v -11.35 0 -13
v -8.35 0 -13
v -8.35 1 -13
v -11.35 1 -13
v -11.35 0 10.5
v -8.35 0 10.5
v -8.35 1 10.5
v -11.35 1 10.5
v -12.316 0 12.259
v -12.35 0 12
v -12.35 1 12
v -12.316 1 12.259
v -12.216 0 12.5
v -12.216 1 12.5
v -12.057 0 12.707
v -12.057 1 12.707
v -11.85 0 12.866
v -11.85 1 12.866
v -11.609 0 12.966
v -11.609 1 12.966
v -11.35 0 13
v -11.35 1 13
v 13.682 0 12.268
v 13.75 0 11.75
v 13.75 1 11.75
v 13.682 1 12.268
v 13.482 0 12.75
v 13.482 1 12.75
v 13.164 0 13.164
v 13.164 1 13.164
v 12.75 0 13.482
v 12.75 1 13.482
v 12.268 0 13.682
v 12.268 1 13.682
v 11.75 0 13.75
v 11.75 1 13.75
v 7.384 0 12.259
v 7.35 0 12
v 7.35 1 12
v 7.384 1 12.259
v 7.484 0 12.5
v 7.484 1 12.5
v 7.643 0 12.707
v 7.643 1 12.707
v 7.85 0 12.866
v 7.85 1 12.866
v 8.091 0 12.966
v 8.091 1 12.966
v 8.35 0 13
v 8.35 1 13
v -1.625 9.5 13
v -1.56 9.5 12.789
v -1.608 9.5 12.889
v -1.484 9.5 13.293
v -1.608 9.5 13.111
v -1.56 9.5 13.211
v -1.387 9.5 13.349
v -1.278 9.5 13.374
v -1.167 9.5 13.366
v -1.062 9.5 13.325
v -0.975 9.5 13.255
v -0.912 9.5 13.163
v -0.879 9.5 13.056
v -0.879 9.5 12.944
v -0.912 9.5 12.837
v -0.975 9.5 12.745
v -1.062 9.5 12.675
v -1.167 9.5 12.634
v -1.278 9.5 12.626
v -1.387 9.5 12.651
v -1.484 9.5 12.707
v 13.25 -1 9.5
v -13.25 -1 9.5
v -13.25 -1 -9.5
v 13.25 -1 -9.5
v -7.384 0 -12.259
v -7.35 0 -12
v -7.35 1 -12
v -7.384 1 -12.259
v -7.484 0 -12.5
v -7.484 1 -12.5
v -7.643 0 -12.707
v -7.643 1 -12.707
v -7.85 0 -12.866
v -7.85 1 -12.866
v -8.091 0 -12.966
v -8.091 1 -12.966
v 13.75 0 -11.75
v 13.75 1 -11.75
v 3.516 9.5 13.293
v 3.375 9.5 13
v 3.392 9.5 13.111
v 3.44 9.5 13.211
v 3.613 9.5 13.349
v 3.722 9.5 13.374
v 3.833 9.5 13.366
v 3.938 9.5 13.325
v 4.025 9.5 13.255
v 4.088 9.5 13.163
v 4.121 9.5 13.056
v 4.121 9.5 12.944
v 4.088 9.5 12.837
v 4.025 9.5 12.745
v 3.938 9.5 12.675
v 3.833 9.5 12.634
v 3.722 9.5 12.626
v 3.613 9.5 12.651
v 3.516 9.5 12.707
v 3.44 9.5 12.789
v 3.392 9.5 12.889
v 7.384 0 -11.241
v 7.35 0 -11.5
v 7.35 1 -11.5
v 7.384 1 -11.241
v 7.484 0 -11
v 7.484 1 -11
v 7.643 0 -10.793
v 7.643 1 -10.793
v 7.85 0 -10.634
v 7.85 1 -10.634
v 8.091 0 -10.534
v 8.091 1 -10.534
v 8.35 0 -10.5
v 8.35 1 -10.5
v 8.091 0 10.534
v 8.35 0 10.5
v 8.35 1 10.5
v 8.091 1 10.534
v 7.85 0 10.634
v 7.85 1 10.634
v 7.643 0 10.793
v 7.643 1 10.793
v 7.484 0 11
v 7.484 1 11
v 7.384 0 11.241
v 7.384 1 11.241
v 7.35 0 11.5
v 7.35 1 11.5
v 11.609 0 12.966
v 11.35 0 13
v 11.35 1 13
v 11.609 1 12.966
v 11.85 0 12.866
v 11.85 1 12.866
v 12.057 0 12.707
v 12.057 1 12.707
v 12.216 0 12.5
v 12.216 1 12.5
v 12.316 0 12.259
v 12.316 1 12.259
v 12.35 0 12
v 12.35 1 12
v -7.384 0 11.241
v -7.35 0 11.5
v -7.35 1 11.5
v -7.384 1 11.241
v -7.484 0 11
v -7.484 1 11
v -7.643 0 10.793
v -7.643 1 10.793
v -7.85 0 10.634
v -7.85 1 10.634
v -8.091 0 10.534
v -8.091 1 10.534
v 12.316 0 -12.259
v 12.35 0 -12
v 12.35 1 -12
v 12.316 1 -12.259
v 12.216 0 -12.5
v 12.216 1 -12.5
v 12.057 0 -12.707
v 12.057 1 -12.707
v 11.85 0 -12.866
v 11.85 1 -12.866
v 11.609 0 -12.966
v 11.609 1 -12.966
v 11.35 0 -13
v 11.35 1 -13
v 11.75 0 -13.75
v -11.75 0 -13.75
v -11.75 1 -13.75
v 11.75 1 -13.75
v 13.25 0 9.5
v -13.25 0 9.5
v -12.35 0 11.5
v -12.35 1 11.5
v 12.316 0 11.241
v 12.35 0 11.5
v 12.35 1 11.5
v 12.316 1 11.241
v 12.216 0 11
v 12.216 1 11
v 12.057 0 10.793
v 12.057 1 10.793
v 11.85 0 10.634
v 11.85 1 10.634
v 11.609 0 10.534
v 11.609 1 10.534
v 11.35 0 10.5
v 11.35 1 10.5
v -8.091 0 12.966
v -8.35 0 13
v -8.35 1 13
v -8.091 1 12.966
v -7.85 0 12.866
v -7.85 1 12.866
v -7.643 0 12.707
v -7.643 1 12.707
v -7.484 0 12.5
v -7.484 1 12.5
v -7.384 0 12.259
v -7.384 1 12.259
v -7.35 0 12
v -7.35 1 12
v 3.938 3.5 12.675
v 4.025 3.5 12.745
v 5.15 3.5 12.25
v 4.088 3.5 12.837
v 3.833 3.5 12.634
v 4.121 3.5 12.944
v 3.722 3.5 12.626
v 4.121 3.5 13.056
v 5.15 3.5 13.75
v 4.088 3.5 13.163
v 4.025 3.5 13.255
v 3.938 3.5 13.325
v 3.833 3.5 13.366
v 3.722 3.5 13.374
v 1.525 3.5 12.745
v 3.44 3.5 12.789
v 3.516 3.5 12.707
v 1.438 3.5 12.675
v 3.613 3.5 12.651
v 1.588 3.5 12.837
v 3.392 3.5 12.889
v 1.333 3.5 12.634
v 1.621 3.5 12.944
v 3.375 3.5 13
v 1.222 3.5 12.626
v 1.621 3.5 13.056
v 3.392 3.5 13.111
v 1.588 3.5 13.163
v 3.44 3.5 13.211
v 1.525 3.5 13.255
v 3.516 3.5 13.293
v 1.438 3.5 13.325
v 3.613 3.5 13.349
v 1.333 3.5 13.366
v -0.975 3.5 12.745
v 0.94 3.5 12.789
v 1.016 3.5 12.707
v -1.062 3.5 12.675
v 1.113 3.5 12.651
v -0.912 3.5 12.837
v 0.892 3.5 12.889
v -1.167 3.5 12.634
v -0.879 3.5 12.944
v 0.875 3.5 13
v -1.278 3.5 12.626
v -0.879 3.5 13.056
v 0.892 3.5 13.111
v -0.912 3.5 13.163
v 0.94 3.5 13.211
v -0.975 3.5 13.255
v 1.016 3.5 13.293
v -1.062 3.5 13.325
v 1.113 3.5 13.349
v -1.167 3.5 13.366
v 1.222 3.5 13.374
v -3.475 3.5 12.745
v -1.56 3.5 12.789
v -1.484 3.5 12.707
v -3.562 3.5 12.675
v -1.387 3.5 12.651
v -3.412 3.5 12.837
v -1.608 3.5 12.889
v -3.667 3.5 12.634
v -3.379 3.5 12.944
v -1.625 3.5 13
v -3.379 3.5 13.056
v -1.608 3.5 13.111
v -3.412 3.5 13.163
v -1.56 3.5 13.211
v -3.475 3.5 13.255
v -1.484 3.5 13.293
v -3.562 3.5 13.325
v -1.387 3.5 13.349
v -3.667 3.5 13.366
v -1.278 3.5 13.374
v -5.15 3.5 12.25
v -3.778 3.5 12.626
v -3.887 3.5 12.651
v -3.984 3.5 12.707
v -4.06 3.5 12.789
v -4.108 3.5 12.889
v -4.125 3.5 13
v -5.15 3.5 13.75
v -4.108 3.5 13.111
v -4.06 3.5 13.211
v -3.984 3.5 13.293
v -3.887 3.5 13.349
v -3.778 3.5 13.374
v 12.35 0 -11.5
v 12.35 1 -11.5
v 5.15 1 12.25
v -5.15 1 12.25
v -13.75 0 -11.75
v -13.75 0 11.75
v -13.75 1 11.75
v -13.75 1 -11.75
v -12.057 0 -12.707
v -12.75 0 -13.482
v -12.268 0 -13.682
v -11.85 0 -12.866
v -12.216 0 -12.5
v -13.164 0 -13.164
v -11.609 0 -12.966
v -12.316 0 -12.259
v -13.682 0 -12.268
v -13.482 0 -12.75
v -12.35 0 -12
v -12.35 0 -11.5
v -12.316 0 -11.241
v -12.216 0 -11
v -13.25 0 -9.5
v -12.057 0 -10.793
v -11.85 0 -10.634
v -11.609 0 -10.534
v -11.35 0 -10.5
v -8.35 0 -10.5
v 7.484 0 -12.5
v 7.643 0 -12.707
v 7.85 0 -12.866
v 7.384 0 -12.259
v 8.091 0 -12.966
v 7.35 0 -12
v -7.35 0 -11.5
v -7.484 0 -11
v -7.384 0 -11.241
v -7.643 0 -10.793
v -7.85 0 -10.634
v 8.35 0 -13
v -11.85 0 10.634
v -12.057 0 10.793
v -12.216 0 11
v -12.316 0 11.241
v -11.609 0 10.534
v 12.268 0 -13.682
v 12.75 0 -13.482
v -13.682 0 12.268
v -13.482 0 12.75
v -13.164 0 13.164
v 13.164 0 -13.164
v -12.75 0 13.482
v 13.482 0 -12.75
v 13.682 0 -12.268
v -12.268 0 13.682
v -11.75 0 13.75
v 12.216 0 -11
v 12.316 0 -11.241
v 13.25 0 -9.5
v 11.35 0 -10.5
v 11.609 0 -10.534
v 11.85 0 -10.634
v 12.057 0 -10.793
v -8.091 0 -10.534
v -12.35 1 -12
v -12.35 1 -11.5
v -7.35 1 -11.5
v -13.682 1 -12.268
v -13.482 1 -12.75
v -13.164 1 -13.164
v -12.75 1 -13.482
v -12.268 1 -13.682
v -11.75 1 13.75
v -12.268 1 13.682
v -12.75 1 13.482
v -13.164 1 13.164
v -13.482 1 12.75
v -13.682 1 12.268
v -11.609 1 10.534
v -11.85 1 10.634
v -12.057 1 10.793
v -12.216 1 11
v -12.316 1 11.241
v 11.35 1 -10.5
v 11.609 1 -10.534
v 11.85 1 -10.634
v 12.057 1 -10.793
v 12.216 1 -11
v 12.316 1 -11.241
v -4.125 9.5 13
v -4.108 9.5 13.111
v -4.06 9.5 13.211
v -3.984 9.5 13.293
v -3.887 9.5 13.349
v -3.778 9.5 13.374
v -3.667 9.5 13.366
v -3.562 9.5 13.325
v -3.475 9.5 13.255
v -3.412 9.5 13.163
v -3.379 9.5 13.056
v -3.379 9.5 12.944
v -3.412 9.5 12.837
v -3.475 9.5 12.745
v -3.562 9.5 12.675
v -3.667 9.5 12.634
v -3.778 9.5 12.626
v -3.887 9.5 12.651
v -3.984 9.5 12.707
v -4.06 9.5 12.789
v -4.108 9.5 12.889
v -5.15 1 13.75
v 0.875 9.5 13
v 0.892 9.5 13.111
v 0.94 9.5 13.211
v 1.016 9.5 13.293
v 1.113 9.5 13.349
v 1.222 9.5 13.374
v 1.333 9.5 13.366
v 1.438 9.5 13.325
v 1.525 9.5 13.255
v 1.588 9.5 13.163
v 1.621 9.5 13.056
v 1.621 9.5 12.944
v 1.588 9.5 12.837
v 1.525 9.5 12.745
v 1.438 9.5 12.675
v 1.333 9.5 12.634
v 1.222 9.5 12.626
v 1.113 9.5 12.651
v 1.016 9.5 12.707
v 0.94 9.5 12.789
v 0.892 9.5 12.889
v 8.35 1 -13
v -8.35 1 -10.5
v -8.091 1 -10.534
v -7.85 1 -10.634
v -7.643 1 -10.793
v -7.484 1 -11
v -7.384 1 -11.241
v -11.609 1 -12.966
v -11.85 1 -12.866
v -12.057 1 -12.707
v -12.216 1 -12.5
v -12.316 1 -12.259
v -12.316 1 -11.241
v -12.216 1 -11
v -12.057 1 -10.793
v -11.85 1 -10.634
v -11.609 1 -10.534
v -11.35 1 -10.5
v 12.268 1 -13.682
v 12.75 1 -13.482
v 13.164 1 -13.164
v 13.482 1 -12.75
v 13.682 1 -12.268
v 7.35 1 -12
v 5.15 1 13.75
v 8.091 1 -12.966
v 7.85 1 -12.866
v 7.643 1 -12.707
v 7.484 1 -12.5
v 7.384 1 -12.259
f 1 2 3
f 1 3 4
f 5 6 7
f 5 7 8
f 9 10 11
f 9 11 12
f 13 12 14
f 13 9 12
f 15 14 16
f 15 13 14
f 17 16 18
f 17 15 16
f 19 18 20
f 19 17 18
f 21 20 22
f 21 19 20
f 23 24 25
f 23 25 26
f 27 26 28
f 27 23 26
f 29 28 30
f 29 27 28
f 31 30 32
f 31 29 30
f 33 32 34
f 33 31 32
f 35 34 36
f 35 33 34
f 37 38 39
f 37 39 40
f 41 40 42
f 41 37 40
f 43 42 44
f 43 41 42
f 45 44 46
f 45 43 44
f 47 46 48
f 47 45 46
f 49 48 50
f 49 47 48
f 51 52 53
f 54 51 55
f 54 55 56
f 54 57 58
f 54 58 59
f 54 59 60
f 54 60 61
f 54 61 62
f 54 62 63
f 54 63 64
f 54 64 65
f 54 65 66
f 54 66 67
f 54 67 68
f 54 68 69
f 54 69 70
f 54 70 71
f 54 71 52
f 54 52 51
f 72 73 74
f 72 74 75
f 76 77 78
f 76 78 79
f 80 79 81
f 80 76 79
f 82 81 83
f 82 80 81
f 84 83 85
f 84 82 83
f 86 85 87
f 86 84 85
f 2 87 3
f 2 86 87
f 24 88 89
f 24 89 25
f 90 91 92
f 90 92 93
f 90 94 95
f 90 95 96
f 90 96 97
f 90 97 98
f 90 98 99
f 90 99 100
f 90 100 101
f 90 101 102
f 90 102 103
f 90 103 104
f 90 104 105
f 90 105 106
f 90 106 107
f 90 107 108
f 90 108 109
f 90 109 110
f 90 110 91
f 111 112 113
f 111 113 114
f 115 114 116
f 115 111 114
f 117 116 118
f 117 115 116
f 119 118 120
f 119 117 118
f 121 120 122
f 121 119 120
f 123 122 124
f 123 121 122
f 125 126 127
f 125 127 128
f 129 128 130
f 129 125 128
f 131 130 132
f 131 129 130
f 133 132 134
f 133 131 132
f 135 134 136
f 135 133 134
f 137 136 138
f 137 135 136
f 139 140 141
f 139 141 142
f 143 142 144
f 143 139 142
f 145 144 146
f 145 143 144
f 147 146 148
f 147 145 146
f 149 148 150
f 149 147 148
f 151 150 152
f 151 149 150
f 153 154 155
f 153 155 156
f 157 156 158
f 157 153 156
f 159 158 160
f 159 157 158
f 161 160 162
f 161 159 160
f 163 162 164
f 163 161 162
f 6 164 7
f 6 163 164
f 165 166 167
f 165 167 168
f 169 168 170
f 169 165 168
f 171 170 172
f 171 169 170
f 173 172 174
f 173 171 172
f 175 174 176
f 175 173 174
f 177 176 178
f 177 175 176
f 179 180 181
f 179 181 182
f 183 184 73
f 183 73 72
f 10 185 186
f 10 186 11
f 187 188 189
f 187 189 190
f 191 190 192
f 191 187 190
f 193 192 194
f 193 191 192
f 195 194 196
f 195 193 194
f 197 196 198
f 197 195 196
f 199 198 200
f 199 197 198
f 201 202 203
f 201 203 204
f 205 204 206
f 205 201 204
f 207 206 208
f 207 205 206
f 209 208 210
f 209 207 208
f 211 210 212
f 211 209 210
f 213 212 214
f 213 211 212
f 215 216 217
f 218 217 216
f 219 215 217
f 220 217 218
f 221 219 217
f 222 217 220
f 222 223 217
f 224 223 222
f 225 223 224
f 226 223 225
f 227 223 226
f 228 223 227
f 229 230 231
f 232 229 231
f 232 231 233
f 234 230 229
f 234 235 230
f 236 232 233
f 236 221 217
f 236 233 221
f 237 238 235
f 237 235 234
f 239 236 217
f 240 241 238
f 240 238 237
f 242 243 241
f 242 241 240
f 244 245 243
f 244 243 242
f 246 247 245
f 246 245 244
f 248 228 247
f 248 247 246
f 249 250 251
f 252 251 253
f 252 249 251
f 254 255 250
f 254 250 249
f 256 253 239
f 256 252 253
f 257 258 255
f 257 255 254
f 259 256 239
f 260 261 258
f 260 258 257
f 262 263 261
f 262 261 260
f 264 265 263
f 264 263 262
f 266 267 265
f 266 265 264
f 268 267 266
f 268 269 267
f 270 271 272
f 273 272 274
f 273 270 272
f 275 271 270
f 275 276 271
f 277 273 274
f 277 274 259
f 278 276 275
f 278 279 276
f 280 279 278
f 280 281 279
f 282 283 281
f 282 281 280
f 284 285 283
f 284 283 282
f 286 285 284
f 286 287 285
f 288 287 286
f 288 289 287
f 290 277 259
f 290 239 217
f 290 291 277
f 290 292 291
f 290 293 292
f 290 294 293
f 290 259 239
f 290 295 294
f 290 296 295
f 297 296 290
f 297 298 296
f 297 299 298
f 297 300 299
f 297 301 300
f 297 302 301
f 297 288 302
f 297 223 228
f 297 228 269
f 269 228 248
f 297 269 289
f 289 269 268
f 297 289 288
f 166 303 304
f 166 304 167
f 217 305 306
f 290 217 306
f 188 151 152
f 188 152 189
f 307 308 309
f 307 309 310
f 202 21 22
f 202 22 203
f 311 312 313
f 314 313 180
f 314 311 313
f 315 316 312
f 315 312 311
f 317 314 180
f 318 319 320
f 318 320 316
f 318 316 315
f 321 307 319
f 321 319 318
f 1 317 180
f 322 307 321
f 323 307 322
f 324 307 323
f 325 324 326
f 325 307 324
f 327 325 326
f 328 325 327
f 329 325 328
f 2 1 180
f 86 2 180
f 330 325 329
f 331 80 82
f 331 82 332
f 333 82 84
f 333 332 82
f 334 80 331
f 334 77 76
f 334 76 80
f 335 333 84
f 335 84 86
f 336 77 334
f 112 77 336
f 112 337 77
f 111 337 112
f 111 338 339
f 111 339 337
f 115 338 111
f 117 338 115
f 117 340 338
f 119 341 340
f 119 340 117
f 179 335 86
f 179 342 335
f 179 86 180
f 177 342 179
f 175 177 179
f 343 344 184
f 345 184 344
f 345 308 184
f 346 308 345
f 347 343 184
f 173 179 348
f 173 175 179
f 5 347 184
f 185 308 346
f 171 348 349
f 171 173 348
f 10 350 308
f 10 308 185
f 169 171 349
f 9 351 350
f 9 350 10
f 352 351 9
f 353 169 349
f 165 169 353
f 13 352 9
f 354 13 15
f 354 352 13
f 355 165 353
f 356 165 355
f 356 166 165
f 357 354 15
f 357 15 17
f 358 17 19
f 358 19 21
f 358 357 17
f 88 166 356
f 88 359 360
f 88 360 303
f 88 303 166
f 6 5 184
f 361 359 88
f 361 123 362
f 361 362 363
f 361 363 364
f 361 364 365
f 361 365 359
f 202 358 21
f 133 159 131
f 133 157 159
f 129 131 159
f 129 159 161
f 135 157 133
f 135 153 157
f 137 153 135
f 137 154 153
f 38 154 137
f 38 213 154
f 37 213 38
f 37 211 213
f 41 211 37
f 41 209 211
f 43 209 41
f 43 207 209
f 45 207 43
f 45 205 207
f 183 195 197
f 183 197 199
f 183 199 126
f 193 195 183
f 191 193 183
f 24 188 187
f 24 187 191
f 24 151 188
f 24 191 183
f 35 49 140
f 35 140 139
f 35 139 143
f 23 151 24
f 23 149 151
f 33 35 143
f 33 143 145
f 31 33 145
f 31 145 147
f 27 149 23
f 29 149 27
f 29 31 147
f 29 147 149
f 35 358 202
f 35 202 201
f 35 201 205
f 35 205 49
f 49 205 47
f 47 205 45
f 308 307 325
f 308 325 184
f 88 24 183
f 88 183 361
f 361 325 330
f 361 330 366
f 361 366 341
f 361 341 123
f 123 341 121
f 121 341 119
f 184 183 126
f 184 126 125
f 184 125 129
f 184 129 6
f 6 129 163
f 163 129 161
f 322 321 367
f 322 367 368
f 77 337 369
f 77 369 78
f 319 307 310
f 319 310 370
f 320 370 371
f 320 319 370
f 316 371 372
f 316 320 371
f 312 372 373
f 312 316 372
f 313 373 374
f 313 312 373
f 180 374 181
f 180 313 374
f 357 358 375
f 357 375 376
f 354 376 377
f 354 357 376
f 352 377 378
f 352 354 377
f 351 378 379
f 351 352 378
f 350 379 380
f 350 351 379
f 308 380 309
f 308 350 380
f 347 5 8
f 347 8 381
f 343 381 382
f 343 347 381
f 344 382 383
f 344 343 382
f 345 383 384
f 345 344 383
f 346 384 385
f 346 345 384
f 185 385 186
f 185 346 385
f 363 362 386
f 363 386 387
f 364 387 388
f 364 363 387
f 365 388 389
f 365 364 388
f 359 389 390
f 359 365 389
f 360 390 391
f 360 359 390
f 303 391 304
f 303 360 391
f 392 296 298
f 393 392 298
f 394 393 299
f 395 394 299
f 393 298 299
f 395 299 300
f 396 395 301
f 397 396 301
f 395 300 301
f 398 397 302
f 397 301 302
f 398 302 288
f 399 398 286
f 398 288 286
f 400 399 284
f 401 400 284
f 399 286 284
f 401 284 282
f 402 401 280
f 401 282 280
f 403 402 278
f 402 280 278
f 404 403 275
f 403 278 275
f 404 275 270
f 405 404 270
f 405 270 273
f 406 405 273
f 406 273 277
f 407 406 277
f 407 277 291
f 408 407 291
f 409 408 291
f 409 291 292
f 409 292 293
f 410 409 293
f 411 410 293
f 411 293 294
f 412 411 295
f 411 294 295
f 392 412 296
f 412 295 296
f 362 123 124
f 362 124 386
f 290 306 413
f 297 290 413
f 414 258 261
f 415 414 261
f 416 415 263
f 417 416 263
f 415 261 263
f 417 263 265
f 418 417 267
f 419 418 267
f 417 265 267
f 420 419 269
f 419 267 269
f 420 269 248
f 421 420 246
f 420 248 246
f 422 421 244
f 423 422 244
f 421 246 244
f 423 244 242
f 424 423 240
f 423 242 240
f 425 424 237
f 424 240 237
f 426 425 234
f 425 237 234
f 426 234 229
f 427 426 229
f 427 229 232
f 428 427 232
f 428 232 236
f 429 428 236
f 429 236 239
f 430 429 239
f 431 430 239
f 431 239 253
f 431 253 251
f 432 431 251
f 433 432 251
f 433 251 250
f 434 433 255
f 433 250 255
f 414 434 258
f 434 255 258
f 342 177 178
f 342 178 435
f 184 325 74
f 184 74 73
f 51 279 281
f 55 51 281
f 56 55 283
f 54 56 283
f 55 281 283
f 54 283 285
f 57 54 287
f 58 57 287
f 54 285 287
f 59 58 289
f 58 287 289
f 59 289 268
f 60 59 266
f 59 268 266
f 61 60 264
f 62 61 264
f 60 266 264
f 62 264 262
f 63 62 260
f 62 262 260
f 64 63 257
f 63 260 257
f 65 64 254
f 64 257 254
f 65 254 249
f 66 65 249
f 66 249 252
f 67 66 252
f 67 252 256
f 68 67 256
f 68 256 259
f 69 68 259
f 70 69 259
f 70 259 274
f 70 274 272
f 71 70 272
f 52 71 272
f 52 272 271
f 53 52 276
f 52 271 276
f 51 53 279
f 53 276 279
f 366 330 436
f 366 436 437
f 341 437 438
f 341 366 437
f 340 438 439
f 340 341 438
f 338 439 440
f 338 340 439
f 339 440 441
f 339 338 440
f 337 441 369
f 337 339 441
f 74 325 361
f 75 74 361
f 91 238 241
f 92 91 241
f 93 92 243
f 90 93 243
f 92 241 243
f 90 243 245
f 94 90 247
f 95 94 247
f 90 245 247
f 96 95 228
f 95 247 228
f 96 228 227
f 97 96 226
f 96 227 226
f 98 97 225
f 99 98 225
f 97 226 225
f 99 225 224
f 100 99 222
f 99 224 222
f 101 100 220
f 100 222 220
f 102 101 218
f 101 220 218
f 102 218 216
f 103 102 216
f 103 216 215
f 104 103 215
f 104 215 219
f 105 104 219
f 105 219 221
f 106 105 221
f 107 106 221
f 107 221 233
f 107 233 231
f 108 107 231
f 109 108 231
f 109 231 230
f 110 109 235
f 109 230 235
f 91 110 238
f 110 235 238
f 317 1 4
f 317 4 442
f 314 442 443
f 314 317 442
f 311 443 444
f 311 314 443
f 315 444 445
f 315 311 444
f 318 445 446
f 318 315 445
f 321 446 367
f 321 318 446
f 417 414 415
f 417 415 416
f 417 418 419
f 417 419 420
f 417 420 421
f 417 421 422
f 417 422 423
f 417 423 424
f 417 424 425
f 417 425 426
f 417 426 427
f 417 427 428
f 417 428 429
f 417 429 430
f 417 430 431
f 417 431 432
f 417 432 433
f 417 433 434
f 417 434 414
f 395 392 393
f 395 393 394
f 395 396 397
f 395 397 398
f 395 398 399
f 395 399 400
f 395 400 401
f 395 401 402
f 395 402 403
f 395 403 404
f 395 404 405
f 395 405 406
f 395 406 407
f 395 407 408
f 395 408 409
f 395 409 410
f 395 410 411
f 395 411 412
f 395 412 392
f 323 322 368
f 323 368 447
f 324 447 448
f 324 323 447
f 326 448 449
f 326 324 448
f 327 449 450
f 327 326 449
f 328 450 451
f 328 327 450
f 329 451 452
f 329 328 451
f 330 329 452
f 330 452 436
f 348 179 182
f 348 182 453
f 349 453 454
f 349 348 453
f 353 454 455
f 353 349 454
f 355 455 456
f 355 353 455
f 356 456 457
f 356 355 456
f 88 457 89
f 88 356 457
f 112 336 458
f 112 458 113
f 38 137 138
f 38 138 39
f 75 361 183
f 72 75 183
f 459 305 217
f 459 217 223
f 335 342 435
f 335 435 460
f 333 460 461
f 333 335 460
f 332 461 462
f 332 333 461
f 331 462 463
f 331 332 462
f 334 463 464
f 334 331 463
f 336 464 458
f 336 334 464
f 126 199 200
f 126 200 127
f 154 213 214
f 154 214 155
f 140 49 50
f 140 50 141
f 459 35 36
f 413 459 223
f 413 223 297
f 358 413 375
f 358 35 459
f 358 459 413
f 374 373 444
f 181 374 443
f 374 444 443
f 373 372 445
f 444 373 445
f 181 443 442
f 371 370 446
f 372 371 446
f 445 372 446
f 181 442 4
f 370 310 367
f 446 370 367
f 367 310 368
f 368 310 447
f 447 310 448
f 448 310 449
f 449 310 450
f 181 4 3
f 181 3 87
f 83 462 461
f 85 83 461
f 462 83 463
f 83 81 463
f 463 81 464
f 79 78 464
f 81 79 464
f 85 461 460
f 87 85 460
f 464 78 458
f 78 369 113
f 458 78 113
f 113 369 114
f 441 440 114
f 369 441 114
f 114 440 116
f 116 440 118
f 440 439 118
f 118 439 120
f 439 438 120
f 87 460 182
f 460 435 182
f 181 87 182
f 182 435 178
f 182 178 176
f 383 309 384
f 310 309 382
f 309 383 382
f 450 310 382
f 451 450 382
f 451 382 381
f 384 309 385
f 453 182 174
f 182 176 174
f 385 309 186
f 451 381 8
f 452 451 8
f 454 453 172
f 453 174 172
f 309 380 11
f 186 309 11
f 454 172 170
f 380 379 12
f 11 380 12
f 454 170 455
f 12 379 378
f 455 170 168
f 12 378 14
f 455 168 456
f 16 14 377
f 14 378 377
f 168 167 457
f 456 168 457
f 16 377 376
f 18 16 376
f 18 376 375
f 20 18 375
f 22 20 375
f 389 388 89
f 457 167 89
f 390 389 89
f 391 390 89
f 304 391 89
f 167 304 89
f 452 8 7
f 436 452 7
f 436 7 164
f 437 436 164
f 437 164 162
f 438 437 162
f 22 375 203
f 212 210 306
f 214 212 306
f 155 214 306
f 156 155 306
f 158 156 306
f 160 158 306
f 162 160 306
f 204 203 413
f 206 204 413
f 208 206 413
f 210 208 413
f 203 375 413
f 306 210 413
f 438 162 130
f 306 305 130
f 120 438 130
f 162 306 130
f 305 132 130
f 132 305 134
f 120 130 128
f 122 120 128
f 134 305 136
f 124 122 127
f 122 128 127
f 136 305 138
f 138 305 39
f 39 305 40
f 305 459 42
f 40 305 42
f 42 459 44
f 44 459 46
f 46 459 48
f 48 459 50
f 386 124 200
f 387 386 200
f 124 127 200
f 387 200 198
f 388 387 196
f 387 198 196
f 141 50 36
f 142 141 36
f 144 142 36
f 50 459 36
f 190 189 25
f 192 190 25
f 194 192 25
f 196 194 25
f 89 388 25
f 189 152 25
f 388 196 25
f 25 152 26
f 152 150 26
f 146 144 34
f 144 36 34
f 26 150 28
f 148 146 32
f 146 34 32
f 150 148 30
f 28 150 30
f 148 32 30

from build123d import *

# Parameters (mm, degrees)
F1_DEPTH = 1
F2_W     = 26.5
F2_H     = 19
F3_DEPTH = 1
F4_W     = 10.3
F4_H     = 1.5
F5_DEPTH = 2.5
F6_R     = 0.375
F7_DEPTH = 6


with BuildPart() as f1:
    # F0 (on Front) → F1 (new body)
    with BuildSketch(Plane.XZ):
        with BuildLine():
            ThreePointArc((13.75, 11.75), (13.164214, 13.164214), (11.75, 13.75))
            Line((11.75, 13.75), (-11.75, 13.75))
            ThreePointArc((-11.75, 13.75), (-13.164214, 13.164214), (-13.75, 11.75))
            Line((-13.75, 11.75), (-13.75, -11.75))
            ThreePointArc((-13.75, -11.75), (-13.164214, -13.164214), (-11.75, -13.75))
            Line((-11.75, -13.75), (11.75, -13.75))
            ThreePointArc((11.75, -13.75), (13.164214, -13.164214), (13.75, -11.75))
            Line((13.75, -11.75), (13.75, 11.75))
        make_face()
        with BuildLine():
            Line((-11.35, -10.5), (-8.35, -10.5))
            ThreePointArc((-8.35, -10.5), (-7.642893, -10.792893), (-7.35, -11.5))
            Line((-7.35, -11.5), (-7.35, -12))
            ThreePointArc((-7.35, -12), (-7.642893, -12.707107), (-8.35, -13))
            Line((-8.35, -13), (-11.35, -13))
            ThreePointArc((-11.35, -13), (-12.057107, -12.707107), (-12.35, -12))
            Line((-12.35, -12), (-12.35, -11.5))
            ThreePointArc((-12.35, -11.5), (-12.057107, -10.792893), (-11.35, -10.5))
        make_face(mode=Mode.SUBTRACT)
        with BuildLine():
            Line((7.35, -12), (7.35, -11.5))
            ThreePointArc((7.35, -11.5), (7.642893, -10.792893), (8.35, -10.5))
            Line((8.35, -10.5), (11.35, -10.5))
            ThreePointArc((11.35, -10.5), (12.057107, -10.792893), (12.35, -11.5))
            Line((12.35, -11.5), (12.35, -12))
            ThreePointArc((12.35, -12), (12.057107, -12.707107), (11.35, -13))
            Line((11.35, -13), (8.35, -13))
            ThreePointArc((8.35, -13), (7.642893, -12.707107), (7.35, -12))
        make_face(mode=Mode.SUBTRACT)
        with BuildLine():
            Line((-7.35, 12), (-7.35, 11.5))
            ThreePointArc((-7.35, 11.5), (-7.642893, 10.792893), (-8.35, 10.5))
            Line((-8.35, 10.5), (-11.35, 10.5))
            ThreePointArc((-11.35, 10.5), (-12.057107, 10.792893), (-12.35, 11.5))
            Line((-12.35, 11.5), (-12.35, 12))
            ThreePointArc((-12.35, 12), (-12.057107, 12.707107), (-11.35, 13))
            Line((-11.35, 13), (-8.35, 13))
            ThreePointArc((-8.35, 13), (-7.642893, 12.707107), (-7.35, 12))
        make_face(mode=Mode.SUBTRACT)
        with BuildLine():
            Line((11.35, 10.5), (8.35, 10.5))
            ThreePointArc((8.35, 10.5), (7.642893, 10.792893), (7.35, 11.5))
            Line((7.35, 11.5), (7.35, 12))
            ThreePointArc((7.35, 12), (7.642893, 12.707107), (8.35, 13))
            Line((8.35, 13), (11.35, 13))
            ThreePointArc((11.35, 13), (12.057107, 12.707107), (12.35, 12))
            Line((12.35, 12), (12.35, 11.5))
            ThreePointArc((12.35, 11.5), (12.057107, 10.792893), (11.35, 10.5))
        make_face(mode=Mode.SUBTRACT)
    extrude(amount=-F1_DEPTH)

    # F2 (on face) → F3 (join)
    with BuildSketch(Plane.XZ):
        Rectangle(F2_W, F2_H)
    extrude(amount=F3_DEPTH)

    # F4 (on face) → F5 (join)
    with BuildSketch(Plane(origin=(0, 1, 0), x_dir=(-1, 0, 0), z_dir=(0, 1, 0))):
        with Locations((0, 13)):
            Rectangle(F4_W, F4_H)
    extrude(amount=F5_DEPTH)

    # F6 (on face) → F7 (join)
    with BuildSketch(Plane(origin=(0, 3.5, 0), x_dir=(-1, 0, 0), z_dir=(0, 1, 0))):
        with Locations((-1.25, 13)):
            Circle(F6_R)
        with Locations((-3.75, 13)):
            Circle(F6_R)
        with Locations((1.25, 13)):
            Circle(F6_R)
        with Locations((3.75, 13)):
            Circle(F6_R)
    extrude(amount=F7_DEPTH)


solid = f1.part
